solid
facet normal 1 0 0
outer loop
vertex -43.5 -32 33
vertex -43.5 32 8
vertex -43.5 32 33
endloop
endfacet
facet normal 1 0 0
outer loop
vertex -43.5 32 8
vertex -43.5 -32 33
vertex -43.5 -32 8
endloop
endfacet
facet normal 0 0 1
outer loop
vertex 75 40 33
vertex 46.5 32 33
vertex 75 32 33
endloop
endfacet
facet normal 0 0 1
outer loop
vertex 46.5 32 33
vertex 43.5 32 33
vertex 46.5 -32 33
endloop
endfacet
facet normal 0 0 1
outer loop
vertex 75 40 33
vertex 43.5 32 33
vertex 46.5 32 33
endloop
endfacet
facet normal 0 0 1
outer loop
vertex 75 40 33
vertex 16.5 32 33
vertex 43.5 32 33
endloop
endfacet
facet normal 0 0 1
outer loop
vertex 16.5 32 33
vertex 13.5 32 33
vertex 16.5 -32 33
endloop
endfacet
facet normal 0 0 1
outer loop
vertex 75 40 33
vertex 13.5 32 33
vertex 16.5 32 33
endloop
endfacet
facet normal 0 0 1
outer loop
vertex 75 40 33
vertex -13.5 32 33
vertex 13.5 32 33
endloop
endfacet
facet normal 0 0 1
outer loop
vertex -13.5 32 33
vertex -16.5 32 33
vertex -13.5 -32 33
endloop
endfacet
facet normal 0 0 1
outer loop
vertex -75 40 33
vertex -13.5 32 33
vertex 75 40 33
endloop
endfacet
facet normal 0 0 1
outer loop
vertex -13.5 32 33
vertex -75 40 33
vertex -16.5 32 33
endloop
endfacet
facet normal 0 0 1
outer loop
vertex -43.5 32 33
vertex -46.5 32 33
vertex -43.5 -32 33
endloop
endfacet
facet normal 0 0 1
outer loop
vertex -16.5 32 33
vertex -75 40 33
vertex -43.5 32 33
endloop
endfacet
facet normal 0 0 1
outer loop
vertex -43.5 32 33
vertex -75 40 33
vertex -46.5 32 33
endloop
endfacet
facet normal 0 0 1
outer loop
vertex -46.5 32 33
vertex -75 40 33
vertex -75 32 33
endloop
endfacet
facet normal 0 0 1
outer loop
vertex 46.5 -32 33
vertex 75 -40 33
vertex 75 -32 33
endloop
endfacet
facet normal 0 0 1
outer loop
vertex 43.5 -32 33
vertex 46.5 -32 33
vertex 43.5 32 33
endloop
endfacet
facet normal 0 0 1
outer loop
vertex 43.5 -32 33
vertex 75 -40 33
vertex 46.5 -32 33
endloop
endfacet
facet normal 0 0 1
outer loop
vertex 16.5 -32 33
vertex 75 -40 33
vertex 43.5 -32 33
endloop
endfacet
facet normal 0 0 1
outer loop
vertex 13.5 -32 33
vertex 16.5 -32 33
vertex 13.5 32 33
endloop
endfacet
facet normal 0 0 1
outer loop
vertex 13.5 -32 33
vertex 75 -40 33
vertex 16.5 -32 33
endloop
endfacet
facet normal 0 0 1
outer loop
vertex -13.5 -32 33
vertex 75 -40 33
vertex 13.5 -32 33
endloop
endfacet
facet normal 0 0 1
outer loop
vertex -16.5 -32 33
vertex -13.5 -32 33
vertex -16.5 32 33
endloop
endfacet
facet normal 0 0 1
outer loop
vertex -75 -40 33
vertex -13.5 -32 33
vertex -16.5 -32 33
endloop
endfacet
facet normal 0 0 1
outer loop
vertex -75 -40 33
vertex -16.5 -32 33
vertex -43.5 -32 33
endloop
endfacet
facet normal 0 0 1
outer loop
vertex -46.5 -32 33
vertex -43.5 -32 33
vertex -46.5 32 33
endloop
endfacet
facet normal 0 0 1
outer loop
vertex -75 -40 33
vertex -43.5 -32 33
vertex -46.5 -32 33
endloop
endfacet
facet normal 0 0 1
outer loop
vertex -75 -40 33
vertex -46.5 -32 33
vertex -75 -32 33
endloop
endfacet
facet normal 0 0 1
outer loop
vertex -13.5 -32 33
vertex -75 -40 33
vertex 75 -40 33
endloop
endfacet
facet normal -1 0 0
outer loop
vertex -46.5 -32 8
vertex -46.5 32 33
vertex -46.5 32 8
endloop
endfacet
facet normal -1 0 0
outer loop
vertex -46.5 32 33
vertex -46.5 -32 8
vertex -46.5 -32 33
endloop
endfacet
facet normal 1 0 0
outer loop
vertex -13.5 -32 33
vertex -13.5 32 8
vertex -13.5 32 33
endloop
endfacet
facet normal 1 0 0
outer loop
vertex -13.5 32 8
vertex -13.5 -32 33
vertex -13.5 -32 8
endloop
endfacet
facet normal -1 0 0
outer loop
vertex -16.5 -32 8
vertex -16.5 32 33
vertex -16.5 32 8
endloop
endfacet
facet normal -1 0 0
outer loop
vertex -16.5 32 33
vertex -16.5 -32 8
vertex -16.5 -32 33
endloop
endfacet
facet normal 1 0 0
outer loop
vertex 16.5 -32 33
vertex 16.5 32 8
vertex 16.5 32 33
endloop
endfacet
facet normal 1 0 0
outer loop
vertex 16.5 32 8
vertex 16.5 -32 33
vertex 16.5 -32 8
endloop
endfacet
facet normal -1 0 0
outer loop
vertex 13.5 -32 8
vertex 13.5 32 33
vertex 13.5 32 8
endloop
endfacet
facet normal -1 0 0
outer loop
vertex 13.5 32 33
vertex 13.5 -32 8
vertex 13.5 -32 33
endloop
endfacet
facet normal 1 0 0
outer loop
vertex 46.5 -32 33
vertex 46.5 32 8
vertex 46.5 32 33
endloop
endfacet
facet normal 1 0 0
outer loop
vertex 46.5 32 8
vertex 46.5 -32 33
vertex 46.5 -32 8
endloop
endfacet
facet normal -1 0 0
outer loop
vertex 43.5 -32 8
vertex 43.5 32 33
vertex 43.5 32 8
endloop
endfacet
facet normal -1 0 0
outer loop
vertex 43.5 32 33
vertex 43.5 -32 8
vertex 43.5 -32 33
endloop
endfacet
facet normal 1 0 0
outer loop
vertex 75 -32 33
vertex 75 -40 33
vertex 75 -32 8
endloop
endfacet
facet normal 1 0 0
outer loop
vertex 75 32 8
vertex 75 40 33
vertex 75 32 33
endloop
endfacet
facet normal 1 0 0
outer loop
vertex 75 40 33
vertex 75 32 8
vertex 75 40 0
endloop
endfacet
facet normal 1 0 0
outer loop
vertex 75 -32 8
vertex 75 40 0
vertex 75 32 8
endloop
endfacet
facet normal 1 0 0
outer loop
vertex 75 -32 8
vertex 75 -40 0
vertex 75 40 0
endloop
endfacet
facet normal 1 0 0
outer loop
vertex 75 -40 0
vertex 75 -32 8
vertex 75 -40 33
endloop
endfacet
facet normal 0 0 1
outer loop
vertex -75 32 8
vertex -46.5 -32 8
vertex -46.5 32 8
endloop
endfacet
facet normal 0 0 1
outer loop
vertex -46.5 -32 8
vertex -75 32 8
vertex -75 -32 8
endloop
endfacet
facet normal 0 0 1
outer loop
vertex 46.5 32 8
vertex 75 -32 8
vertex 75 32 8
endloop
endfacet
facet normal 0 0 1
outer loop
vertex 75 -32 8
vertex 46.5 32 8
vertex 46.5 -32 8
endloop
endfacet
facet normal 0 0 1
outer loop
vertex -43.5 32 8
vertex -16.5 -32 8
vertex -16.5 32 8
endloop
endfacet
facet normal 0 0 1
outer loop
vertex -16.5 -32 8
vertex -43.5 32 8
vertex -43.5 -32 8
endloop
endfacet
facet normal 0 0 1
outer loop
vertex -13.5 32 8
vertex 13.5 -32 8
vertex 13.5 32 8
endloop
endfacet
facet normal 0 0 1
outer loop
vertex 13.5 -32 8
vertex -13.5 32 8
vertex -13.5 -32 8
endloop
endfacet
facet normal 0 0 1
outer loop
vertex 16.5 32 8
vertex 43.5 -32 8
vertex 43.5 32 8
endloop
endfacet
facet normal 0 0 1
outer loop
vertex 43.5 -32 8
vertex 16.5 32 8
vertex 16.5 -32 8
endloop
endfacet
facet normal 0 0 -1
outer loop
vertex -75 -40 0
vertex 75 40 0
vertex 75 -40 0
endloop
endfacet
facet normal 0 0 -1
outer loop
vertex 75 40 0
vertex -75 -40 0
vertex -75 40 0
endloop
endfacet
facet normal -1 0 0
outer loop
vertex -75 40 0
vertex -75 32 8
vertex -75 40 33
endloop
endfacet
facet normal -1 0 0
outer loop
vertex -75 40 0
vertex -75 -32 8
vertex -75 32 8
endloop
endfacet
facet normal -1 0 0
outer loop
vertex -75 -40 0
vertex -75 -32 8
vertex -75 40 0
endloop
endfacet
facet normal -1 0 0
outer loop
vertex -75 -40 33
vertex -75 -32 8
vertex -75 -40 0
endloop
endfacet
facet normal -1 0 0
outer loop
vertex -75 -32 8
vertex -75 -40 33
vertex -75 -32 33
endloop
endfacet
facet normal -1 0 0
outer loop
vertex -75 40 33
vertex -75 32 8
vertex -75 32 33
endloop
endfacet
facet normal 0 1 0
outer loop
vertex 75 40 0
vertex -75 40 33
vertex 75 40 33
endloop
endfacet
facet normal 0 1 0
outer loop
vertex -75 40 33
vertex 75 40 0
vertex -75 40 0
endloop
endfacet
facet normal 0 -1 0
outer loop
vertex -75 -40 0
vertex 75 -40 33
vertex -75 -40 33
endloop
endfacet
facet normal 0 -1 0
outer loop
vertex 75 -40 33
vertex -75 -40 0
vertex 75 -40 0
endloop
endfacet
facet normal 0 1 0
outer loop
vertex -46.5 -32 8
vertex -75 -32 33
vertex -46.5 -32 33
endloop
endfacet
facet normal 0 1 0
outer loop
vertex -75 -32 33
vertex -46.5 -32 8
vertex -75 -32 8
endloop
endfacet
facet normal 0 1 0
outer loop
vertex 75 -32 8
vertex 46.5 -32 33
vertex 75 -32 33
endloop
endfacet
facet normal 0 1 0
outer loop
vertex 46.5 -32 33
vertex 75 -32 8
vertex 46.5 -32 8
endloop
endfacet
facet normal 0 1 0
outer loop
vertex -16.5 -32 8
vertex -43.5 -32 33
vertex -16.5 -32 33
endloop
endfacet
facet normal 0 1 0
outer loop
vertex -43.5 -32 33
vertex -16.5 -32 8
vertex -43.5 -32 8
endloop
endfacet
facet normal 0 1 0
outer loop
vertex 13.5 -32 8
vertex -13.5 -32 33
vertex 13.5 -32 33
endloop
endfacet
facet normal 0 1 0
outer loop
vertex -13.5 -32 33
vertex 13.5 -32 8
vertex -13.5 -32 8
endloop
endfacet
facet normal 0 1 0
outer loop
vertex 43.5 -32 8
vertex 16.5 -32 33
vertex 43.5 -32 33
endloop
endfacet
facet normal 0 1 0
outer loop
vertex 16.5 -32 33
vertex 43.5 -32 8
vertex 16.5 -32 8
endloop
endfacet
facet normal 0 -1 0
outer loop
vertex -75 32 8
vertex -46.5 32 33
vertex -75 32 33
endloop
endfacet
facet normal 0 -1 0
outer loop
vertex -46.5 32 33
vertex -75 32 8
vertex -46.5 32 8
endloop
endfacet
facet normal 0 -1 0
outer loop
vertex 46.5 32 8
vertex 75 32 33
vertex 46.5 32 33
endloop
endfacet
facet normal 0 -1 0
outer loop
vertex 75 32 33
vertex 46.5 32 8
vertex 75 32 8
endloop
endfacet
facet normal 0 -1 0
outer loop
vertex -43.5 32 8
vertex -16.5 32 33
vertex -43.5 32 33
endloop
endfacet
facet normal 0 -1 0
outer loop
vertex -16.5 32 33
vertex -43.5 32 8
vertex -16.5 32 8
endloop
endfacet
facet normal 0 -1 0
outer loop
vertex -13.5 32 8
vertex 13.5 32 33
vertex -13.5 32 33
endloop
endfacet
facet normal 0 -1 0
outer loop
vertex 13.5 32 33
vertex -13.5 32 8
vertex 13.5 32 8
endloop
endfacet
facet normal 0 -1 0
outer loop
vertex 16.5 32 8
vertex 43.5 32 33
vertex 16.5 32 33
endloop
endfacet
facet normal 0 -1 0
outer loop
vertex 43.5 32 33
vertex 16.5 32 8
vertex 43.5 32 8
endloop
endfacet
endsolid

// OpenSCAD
$fn = 32;

// ----------------------------------------------------------------------
// Rib frame 150 x 80 x 33
// 4 ribs at 30 mm pitch
// ----------------------------------------------------------------------

// --- parameters (mm) ---
frame = [150, 80, 8];  // base plate size (x, y, z)
rail_w = 8;            // side rail width
ribs = 4;              // number of ribs
rib_t = 3;             // rib thickness
rib_h = 25;            // rib height above the base plate
pitch = 30;            // pitch between rib centres

// --- derived feature positions (mm) ---
span = (ribs - 1) * pitch;          // = 90   distance between the outer ribs
origin_x = -span / 2;               // = -45   X of the first rib
rib_len = frame[1] - 2 * rail_w + 2;  // = 66   rib length, 1 mm into each rail
feature_centers = [
  [origin_x + 0 * pitch, 0],
  [origin_x + 1 * pitch, 0],
  [origin_x + 2 * pitch, 0],
  [origin_x + 3 * pitch, 0]
];   // rib centre line, drives the rib loop

// base plate, two side rails, then the ribs read straight off feature_centers
union() {
  translate([-frame[0] / 2, -frame[1] / 2, 0]) cube(frame);
  translate([-frame[0] / 2, -frame[1] / 2, 0]) cube([frame[0], rail_w, frame[2] + rib_h]);
  translate([-frame[0] / 2, frame[1] / 2 - rail_w, 0]) cube([frame[0], rail_w, frame[2] + rib_h]);
  for (centre = feature_centers)
    translate([centre[0] - rib_t / 2, centre[1] - rib_len / 2, frame[2] - 1])
      cube([rib_t, rib_len, rib_h + 1]);
}
